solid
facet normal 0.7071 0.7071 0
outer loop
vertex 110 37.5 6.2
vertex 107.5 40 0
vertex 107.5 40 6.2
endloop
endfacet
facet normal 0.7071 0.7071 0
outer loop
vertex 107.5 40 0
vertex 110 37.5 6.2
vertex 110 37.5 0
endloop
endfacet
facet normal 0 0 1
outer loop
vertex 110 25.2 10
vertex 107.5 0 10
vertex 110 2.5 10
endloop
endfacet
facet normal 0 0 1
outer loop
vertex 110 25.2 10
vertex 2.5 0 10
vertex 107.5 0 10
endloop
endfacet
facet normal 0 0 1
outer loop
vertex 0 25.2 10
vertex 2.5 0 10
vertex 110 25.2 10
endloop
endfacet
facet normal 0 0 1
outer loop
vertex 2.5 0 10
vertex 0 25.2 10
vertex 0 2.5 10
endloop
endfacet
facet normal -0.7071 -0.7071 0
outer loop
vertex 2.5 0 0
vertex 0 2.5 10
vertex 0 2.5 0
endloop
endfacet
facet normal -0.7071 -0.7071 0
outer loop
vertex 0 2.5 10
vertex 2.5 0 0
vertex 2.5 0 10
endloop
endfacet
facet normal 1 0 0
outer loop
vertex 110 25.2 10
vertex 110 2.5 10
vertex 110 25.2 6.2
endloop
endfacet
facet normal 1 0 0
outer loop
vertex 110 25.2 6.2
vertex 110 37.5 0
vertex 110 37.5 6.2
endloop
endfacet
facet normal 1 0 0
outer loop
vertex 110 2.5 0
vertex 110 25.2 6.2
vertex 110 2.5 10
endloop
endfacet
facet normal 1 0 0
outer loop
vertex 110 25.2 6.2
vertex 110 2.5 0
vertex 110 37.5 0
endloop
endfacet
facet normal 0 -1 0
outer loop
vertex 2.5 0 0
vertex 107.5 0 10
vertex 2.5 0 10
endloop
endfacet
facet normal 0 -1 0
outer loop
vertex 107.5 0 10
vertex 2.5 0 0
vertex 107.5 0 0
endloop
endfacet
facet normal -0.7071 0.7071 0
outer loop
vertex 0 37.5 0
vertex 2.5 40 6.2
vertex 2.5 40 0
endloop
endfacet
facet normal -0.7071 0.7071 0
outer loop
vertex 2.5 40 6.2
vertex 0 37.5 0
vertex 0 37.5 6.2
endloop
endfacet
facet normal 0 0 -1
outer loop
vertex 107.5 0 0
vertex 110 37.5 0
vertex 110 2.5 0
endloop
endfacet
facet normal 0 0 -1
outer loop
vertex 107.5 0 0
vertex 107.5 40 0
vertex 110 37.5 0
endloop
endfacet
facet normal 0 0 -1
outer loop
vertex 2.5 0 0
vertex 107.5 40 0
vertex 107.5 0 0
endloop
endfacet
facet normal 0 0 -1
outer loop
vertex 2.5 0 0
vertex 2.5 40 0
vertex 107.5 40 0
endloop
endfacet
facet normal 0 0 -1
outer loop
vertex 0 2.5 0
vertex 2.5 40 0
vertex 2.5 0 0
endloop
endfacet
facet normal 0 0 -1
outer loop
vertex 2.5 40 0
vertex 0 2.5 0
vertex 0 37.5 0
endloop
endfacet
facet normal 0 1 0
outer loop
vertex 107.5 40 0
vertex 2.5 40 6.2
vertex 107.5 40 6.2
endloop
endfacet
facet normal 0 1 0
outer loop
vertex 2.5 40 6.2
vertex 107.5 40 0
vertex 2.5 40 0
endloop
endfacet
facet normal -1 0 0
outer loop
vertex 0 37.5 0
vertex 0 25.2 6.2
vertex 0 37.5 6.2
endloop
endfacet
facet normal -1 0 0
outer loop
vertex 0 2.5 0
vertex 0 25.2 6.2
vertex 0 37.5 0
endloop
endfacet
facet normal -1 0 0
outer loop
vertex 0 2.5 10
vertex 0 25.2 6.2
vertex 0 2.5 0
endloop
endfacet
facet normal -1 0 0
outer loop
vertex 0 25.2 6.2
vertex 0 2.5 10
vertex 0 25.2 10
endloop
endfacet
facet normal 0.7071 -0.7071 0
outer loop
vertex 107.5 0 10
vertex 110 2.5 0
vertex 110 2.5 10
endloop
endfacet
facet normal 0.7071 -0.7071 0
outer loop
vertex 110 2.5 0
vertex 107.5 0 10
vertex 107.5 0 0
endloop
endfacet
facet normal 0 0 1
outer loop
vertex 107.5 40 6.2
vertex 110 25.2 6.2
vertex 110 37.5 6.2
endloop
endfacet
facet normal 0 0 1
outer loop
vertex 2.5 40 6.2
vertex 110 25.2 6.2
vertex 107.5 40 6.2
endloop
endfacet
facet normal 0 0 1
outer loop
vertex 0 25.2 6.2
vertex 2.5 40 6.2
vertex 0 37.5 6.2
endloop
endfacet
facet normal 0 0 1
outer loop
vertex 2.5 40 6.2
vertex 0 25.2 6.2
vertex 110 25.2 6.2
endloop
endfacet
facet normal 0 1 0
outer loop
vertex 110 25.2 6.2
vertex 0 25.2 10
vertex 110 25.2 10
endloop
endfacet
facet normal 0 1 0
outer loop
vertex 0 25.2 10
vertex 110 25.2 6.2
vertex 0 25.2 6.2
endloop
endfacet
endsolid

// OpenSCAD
$fn = 32;

// ----------------------------------------------------------------------
// Stepped bar: sidestep, 110 x 40 x 10/6.2 mm
// ----------------------------------------------------------------------

// --- parameters (mm) ---
bar_l = 110;              // bar length, X
bar_w = 40;               // bar width, Y
plate_t = 10;             // thickness of the thick zone, Z
thin_t = 6.2;             // thickness of the thin zone
corner_c = 2.5;           // corner chamfer of the bar
step_cut = 3.8;           // material removed from the thin zone
ledge_y = 25.2;           // start of the ledge from the front edge
depth_1 = 3.8;            // depth of cut 1 from the top face

profile = [[2.5, 0], [107.5, 0], [110, 2.5], [110, 37.5], [107.5, 40], [2.5, 40], [0, 37.5], [0, 2.5]];  // primary outline, 8 points, counter clockwise
void_1 = [[-1, 25.2], [111, 25.2], [111, 41], [-1, 41]];  // ledge cut along one edge, 4 points

// --- the one profile operation ---
difference() {
  linear_extrude(height = plate_t) polygon(points = profile);
  translate([0, 0, plate_t - depth_1])
    linear_extrude(height = depth_1 + 1) polygon(points = void_1);
}
